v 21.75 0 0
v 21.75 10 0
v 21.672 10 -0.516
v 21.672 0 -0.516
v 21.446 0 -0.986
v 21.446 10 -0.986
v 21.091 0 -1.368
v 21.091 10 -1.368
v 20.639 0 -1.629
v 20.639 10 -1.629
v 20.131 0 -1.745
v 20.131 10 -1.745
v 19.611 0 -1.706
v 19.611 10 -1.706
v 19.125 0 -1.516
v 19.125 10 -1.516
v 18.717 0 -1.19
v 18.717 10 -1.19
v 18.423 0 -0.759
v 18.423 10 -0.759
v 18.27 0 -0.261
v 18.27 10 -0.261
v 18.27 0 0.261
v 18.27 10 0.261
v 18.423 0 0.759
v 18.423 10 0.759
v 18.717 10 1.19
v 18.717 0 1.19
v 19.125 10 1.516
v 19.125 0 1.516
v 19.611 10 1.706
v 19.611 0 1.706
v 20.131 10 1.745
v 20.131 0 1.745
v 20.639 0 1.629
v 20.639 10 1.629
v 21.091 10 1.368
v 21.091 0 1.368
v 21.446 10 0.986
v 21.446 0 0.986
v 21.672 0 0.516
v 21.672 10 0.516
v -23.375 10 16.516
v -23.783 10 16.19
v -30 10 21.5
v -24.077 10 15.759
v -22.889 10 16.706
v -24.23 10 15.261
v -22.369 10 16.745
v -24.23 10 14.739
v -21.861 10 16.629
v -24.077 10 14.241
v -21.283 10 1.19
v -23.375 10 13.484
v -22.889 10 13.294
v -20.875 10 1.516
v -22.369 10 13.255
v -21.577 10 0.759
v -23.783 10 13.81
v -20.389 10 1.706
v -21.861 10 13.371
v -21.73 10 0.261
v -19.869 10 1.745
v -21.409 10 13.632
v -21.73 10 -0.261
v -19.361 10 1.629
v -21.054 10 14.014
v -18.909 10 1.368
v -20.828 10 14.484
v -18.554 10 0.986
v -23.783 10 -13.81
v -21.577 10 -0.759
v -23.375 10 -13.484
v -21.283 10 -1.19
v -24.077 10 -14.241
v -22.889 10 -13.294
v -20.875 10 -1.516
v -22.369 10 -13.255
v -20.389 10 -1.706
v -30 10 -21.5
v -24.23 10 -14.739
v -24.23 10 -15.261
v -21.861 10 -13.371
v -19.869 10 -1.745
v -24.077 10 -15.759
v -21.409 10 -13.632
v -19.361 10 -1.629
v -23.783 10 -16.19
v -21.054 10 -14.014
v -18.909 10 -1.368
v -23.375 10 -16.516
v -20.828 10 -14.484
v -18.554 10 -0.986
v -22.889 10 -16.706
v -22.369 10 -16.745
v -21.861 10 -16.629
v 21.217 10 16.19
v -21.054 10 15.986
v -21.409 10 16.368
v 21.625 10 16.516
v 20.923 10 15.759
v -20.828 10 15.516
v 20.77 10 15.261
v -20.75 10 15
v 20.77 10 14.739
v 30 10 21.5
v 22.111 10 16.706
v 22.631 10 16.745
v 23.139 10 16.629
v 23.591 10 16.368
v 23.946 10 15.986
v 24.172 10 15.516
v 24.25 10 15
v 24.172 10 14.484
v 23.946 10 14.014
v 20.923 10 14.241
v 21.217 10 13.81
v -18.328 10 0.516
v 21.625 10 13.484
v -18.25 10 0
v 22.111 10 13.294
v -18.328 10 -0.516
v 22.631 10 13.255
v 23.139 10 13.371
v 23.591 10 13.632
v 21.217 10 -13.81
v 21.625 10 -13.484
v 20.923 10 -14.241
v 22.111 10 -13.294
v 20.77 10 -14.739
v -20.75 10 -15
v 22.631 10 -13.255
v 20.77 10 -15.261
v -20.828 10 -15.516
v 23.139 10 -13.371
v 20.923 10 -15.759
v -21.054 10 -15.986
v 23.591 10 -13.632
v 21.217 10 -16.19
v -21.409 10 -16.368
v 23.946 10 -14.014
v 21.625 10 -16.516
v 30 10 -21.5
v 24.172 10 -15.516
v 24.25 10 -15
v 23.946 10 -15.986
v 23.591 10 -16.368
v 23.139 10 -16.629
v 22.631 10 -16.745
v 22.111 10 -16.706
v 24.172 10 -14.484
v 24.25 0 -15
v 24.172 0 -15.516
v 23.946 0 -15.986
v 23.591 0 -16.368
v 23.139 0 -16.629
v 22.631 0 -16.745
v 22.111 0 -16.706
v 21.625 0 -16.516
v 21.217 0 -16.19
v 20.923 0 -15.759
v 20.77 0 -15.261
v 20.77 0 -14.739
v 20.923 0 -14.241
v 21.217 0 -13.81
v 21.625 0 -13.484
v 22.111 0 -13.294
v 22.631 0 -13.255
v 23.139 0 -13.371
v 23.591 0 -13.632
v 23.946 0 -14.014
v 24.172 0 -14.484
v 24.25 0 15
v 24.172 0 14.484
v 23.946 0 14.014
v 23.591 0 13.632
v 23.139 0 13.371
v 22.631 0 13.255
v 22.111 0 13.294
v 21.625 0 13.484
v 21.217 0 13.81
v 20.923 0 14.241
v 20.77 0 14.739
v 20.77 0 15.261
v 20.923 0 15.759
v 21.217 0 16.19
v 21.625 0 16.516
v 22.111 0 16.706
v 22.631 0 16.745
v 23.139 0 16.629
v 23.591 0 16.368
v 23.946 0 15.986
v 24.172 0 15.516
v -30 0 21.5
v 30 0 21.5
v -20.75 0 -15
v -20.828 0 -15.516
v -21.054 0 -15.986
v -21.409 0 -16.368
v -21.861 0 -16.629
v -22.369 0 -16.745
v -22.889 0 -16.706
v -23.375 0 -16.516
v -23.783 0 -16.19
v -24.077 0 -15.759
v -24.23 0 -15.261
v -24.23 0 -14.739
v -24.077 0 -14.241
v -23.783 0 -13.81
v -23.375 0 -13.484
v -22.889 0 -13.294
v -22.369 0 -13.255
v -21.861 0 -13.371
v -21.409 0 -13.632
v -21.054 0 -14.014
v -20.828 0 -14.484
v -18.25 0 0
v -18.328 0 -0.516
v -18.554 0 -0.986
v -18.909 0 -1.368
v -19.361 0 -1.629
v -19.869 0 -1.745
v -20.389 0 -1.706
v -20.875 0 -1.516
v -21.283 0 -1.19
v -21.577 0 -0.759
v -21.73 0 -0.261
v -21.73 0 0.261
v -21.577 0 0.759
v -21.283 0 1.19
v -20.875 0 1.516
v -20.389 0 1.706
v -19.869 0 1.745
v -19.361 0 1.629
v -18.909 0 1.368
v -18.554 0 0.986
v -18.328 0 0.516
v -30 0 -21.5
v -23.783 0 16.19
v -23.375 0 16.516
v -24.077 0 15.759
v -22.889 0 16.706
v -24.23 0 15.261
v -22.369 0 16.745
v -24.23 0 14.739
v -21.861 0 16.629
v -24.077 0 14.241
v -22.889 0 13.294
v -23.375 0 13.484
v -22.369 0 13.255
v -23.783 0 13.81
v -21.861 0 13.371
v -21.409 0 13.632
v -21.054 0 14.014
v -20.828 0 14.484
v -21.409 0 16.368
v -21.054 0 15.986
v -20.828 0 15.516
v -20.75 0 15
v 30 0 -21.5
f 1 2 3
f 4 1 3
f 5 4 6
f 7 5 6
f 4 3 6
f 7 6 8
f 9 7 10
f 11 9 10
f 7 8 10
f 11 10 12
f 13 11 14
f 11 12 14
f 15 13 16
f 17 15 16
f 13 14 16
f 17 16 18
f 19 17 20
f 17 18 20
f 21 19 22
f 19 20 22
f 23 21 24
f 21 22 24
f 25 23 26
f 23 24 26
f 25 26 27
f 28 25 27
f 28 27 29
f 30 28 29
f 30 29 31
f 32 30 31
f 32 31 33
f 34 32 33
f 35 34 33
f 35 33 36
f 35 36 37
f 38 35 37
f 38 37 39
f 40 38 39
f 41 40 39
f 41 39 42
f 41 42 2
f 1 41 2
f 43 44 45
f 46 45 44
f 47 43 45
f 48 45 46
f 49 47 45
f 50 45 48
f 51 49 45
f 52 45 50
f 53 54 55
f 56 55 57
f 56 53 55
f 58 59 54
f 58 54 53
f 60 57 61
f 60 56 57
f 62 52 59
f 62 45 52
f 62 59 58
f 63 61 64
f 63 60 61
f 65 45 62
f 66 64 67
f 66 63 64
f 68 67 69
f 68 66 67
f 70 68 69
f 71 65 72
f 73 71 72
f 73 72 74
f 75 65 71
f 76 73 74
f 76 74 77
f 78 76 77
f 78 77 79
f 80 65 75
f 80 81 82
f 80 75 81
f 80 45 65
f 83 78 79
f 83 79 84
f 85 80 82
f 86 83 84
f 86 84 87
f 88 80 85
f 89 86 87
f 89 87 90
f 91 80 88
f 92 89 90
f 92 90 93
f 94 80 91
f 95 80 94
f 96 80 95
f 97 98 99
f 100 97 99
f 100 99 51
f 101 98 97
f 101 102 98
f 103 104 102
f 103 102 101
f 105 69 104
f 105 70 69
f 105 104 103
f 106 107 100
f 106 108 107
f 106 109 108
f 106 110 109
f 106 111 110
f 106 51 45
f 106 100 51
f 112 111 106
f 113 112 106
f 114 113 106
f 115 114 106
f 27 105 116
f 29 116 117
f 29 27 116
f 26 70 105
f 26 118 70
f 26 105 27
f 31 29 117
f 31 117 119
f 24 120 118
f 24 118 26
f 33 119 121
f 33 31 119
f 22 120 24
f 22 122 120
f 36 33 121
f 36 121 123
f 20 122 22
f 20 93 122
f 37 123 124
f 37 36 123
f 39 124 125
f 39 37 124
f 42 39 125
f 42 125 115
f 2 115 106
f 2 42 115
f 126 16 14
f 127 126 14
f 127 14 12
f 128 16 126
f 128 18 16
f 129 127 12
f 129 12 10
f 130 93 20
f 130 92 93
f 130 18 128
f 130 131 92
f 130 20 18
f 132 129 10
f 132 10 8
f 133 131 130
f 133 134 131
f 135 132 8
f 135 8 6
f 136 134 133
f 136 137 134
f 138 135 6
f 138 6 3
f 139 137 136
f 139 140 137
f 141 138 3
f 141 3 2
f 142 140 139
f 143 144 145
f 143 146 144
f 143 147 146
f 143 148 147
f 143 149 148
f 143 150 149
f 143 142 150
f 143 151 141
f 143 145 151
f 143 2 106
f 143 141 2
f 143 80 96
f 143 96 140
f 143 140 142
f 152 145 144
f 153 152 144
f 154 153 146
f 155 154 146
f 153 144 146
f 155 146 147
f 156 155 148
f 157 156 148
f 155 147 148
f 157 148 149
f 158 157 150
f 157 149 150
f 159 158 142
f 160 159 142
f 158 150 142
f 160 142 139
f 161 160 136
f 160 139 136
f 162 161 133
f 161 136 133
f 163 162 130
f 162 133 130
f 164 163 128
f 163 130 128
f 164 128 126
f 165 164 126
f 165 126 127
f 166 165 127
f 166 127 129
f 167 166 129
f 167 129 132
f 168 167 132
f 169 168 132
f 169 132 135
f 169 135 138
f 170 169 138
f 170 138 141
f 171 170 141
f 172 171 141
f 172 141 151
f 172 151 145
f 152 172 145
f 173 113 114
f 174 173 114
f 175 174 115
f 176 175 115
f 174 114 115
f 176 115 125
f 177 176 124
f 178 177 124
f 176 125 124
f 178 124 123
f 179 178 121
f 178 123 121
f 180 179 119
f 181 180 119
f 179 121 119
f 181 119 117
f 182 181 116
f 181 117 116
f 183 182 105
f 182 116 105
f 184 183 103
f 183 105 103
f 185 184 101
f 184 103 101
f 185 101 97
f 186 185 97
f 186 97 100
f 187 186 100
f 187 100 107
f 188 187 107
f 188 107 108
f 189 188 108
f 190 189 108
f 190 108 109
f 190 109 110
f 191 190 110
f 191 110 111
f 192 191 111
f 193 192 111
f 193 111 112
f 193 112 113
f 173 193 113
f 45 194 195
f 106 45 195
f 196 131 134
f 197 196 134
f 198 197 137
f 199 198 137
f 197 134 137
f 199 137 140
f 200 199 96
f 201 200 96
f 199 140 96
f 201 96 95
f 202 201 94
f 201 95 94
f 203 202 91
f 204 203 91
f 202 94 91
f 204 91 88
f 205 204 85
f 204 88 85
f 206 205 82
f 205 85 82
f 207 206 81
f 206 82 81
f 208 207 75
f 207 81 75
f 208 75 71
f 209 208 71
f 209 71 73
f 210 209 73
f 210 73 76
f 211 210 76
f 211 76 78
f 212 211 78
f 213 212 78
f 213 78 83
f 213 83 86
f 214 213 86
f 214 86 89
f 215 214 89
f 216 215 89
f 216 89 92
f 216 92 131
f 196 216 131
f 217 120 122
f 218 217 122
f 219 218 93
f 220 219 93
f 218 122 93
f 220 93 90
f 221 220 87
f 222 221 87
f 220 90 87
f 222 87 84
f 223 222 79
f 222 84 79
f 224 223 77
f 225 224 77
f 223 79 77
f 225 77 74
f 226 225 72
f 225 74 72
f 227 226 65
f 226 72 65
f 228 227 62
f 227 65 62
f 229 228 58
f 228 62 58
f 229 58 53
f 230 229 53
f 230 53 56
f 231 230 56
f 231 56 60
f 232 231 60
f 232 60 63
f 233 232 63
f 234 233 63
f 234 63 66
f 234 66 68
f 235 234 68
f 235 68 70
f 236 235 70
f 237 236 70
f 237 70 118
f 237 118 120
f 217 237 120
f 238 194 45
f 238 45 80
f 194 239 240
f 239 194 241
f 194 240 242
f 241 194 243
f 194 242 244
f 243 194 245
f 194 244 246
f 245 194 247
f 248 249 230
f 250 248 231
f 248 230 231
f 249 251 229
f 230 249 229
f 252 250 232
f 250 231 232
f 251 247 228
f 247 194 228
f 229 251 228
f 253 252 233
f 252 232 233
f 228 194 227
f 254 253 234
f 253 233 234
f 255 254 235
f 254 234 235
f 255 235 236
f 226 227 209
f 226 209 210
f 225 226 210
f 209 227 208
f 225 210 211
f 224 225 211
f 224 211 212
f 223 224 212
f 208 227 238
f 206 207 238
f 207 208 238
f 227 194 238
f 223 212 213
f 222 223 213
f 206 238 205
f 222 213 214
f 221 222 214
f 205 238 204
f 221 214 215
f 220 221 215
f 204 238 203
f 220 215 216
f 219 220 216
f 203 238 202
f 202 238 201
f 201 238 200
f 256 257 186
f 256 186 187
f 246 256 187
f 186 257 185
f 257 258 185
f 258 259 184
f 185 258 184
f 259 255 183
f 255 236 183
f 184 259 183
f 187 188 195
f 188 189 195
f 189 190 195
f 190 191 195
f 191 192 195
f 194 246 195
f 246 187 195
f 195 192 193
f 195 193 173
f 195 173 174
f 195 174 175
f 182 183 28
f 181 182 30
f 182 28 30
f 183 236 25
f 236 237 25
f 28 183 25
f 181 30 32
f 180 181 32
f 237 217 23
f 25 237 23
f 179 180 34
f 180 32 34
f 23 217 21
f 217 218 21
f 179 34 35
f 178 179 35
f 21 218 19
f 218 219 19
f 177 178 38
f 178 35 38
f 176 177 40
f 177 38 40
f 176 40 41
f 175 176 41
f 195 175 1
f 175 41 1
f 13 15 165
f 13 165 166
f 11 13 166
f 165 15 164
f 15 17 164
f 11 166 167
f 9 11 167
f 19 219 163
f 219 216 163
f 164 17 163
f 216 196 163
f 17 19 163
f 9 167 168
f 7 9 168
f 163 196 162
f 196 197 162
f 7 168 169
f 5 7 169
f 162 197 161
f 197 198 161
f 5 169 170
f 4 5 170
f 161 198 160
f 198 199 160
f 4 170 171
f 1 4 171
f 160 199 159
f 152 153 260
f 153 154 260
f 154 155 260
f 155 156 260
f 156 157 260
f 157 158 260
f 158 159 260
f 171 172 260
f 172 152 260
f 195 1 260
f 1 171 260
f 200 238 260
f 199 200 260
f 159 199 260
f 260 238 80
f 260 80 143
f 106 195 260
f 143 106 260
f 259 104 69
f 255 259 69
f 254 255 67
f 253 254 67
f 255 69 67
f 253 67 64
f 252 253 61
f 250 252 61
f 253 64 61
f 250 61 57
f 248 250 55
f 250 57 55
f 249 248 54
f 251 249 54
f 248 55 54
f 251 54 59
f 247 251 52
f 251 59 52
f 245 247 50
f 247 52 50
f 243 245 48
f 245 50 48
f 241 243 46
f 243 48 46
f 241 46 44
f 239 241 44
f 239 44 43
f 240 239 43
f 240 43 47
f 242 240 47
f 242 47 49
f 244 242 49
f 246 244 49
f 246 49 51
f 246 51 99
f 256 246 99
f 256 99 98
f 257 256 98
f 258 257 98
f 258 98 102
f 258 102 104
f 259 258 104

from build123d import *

# Parameters (mm, degrees)
SKETCH_2_W          = 60
SKETCH_2_H          = 43
EXTRUDE_1_DEPTH     = 10
SKETCH_3_R          = 1.75
CUT_EXTRUDE_1_DEPTH = 11
SKETCH_4_R          = 1.75
CUT_EXTRUDE_2_DEPTH = 11


with BuildPart() as part:
    # 草图2 → 凸台-拉伸1 (new body)
    with BuildSketch(Plane(origin=(0, 0, 0), x_dir=(1, 0, 0), z_dir=(0, 1, 0))):
        Rectangle(SKETCH_2_W, SKETCH_2_H)
    extrude(amount=EXTRUDE_1_DEPTH)

    # 草图3 → 切除-拉伸1 (cut, through all)
    with BuildSketch(Plane(origin=(0, 10, 0), x_dir=(1, 0, 0), z_dir=(0, 1, 0))):
        with Locations((-22.5, 15)):
            Circle(SKETCH_3_R)
        with Locations((22.5, 15)):
            Circle(SKETCH_3_R)
        with Locations((22.5, -15)):
            Circle(SKETCH_3_R)
        with Locations((-22.5, -15)):
            Circle(SKETCH_3_R)
    extrude(amount=-CUT_EXTRUDE_1_DEPTH, mode=Mode.SUBTRACT)

    # 草图4 → 切除-拉伸2 (cut, through all)
    with BuildSketch(Plane(origin=(0, 10, 0), x_dir=(1, 0, 0), z_dir=(0, 1, 0))):
        with Locations((-20, 0)):
            Circle(SKETCH_4_R)
        with Locations((20, 0)):
            Circle(SKETCH_4_R)
    extrude(amount=-CUT_EXTRUDE_2_DEPTH, mode=Mode.SUBTRACT)


solid = part.part
